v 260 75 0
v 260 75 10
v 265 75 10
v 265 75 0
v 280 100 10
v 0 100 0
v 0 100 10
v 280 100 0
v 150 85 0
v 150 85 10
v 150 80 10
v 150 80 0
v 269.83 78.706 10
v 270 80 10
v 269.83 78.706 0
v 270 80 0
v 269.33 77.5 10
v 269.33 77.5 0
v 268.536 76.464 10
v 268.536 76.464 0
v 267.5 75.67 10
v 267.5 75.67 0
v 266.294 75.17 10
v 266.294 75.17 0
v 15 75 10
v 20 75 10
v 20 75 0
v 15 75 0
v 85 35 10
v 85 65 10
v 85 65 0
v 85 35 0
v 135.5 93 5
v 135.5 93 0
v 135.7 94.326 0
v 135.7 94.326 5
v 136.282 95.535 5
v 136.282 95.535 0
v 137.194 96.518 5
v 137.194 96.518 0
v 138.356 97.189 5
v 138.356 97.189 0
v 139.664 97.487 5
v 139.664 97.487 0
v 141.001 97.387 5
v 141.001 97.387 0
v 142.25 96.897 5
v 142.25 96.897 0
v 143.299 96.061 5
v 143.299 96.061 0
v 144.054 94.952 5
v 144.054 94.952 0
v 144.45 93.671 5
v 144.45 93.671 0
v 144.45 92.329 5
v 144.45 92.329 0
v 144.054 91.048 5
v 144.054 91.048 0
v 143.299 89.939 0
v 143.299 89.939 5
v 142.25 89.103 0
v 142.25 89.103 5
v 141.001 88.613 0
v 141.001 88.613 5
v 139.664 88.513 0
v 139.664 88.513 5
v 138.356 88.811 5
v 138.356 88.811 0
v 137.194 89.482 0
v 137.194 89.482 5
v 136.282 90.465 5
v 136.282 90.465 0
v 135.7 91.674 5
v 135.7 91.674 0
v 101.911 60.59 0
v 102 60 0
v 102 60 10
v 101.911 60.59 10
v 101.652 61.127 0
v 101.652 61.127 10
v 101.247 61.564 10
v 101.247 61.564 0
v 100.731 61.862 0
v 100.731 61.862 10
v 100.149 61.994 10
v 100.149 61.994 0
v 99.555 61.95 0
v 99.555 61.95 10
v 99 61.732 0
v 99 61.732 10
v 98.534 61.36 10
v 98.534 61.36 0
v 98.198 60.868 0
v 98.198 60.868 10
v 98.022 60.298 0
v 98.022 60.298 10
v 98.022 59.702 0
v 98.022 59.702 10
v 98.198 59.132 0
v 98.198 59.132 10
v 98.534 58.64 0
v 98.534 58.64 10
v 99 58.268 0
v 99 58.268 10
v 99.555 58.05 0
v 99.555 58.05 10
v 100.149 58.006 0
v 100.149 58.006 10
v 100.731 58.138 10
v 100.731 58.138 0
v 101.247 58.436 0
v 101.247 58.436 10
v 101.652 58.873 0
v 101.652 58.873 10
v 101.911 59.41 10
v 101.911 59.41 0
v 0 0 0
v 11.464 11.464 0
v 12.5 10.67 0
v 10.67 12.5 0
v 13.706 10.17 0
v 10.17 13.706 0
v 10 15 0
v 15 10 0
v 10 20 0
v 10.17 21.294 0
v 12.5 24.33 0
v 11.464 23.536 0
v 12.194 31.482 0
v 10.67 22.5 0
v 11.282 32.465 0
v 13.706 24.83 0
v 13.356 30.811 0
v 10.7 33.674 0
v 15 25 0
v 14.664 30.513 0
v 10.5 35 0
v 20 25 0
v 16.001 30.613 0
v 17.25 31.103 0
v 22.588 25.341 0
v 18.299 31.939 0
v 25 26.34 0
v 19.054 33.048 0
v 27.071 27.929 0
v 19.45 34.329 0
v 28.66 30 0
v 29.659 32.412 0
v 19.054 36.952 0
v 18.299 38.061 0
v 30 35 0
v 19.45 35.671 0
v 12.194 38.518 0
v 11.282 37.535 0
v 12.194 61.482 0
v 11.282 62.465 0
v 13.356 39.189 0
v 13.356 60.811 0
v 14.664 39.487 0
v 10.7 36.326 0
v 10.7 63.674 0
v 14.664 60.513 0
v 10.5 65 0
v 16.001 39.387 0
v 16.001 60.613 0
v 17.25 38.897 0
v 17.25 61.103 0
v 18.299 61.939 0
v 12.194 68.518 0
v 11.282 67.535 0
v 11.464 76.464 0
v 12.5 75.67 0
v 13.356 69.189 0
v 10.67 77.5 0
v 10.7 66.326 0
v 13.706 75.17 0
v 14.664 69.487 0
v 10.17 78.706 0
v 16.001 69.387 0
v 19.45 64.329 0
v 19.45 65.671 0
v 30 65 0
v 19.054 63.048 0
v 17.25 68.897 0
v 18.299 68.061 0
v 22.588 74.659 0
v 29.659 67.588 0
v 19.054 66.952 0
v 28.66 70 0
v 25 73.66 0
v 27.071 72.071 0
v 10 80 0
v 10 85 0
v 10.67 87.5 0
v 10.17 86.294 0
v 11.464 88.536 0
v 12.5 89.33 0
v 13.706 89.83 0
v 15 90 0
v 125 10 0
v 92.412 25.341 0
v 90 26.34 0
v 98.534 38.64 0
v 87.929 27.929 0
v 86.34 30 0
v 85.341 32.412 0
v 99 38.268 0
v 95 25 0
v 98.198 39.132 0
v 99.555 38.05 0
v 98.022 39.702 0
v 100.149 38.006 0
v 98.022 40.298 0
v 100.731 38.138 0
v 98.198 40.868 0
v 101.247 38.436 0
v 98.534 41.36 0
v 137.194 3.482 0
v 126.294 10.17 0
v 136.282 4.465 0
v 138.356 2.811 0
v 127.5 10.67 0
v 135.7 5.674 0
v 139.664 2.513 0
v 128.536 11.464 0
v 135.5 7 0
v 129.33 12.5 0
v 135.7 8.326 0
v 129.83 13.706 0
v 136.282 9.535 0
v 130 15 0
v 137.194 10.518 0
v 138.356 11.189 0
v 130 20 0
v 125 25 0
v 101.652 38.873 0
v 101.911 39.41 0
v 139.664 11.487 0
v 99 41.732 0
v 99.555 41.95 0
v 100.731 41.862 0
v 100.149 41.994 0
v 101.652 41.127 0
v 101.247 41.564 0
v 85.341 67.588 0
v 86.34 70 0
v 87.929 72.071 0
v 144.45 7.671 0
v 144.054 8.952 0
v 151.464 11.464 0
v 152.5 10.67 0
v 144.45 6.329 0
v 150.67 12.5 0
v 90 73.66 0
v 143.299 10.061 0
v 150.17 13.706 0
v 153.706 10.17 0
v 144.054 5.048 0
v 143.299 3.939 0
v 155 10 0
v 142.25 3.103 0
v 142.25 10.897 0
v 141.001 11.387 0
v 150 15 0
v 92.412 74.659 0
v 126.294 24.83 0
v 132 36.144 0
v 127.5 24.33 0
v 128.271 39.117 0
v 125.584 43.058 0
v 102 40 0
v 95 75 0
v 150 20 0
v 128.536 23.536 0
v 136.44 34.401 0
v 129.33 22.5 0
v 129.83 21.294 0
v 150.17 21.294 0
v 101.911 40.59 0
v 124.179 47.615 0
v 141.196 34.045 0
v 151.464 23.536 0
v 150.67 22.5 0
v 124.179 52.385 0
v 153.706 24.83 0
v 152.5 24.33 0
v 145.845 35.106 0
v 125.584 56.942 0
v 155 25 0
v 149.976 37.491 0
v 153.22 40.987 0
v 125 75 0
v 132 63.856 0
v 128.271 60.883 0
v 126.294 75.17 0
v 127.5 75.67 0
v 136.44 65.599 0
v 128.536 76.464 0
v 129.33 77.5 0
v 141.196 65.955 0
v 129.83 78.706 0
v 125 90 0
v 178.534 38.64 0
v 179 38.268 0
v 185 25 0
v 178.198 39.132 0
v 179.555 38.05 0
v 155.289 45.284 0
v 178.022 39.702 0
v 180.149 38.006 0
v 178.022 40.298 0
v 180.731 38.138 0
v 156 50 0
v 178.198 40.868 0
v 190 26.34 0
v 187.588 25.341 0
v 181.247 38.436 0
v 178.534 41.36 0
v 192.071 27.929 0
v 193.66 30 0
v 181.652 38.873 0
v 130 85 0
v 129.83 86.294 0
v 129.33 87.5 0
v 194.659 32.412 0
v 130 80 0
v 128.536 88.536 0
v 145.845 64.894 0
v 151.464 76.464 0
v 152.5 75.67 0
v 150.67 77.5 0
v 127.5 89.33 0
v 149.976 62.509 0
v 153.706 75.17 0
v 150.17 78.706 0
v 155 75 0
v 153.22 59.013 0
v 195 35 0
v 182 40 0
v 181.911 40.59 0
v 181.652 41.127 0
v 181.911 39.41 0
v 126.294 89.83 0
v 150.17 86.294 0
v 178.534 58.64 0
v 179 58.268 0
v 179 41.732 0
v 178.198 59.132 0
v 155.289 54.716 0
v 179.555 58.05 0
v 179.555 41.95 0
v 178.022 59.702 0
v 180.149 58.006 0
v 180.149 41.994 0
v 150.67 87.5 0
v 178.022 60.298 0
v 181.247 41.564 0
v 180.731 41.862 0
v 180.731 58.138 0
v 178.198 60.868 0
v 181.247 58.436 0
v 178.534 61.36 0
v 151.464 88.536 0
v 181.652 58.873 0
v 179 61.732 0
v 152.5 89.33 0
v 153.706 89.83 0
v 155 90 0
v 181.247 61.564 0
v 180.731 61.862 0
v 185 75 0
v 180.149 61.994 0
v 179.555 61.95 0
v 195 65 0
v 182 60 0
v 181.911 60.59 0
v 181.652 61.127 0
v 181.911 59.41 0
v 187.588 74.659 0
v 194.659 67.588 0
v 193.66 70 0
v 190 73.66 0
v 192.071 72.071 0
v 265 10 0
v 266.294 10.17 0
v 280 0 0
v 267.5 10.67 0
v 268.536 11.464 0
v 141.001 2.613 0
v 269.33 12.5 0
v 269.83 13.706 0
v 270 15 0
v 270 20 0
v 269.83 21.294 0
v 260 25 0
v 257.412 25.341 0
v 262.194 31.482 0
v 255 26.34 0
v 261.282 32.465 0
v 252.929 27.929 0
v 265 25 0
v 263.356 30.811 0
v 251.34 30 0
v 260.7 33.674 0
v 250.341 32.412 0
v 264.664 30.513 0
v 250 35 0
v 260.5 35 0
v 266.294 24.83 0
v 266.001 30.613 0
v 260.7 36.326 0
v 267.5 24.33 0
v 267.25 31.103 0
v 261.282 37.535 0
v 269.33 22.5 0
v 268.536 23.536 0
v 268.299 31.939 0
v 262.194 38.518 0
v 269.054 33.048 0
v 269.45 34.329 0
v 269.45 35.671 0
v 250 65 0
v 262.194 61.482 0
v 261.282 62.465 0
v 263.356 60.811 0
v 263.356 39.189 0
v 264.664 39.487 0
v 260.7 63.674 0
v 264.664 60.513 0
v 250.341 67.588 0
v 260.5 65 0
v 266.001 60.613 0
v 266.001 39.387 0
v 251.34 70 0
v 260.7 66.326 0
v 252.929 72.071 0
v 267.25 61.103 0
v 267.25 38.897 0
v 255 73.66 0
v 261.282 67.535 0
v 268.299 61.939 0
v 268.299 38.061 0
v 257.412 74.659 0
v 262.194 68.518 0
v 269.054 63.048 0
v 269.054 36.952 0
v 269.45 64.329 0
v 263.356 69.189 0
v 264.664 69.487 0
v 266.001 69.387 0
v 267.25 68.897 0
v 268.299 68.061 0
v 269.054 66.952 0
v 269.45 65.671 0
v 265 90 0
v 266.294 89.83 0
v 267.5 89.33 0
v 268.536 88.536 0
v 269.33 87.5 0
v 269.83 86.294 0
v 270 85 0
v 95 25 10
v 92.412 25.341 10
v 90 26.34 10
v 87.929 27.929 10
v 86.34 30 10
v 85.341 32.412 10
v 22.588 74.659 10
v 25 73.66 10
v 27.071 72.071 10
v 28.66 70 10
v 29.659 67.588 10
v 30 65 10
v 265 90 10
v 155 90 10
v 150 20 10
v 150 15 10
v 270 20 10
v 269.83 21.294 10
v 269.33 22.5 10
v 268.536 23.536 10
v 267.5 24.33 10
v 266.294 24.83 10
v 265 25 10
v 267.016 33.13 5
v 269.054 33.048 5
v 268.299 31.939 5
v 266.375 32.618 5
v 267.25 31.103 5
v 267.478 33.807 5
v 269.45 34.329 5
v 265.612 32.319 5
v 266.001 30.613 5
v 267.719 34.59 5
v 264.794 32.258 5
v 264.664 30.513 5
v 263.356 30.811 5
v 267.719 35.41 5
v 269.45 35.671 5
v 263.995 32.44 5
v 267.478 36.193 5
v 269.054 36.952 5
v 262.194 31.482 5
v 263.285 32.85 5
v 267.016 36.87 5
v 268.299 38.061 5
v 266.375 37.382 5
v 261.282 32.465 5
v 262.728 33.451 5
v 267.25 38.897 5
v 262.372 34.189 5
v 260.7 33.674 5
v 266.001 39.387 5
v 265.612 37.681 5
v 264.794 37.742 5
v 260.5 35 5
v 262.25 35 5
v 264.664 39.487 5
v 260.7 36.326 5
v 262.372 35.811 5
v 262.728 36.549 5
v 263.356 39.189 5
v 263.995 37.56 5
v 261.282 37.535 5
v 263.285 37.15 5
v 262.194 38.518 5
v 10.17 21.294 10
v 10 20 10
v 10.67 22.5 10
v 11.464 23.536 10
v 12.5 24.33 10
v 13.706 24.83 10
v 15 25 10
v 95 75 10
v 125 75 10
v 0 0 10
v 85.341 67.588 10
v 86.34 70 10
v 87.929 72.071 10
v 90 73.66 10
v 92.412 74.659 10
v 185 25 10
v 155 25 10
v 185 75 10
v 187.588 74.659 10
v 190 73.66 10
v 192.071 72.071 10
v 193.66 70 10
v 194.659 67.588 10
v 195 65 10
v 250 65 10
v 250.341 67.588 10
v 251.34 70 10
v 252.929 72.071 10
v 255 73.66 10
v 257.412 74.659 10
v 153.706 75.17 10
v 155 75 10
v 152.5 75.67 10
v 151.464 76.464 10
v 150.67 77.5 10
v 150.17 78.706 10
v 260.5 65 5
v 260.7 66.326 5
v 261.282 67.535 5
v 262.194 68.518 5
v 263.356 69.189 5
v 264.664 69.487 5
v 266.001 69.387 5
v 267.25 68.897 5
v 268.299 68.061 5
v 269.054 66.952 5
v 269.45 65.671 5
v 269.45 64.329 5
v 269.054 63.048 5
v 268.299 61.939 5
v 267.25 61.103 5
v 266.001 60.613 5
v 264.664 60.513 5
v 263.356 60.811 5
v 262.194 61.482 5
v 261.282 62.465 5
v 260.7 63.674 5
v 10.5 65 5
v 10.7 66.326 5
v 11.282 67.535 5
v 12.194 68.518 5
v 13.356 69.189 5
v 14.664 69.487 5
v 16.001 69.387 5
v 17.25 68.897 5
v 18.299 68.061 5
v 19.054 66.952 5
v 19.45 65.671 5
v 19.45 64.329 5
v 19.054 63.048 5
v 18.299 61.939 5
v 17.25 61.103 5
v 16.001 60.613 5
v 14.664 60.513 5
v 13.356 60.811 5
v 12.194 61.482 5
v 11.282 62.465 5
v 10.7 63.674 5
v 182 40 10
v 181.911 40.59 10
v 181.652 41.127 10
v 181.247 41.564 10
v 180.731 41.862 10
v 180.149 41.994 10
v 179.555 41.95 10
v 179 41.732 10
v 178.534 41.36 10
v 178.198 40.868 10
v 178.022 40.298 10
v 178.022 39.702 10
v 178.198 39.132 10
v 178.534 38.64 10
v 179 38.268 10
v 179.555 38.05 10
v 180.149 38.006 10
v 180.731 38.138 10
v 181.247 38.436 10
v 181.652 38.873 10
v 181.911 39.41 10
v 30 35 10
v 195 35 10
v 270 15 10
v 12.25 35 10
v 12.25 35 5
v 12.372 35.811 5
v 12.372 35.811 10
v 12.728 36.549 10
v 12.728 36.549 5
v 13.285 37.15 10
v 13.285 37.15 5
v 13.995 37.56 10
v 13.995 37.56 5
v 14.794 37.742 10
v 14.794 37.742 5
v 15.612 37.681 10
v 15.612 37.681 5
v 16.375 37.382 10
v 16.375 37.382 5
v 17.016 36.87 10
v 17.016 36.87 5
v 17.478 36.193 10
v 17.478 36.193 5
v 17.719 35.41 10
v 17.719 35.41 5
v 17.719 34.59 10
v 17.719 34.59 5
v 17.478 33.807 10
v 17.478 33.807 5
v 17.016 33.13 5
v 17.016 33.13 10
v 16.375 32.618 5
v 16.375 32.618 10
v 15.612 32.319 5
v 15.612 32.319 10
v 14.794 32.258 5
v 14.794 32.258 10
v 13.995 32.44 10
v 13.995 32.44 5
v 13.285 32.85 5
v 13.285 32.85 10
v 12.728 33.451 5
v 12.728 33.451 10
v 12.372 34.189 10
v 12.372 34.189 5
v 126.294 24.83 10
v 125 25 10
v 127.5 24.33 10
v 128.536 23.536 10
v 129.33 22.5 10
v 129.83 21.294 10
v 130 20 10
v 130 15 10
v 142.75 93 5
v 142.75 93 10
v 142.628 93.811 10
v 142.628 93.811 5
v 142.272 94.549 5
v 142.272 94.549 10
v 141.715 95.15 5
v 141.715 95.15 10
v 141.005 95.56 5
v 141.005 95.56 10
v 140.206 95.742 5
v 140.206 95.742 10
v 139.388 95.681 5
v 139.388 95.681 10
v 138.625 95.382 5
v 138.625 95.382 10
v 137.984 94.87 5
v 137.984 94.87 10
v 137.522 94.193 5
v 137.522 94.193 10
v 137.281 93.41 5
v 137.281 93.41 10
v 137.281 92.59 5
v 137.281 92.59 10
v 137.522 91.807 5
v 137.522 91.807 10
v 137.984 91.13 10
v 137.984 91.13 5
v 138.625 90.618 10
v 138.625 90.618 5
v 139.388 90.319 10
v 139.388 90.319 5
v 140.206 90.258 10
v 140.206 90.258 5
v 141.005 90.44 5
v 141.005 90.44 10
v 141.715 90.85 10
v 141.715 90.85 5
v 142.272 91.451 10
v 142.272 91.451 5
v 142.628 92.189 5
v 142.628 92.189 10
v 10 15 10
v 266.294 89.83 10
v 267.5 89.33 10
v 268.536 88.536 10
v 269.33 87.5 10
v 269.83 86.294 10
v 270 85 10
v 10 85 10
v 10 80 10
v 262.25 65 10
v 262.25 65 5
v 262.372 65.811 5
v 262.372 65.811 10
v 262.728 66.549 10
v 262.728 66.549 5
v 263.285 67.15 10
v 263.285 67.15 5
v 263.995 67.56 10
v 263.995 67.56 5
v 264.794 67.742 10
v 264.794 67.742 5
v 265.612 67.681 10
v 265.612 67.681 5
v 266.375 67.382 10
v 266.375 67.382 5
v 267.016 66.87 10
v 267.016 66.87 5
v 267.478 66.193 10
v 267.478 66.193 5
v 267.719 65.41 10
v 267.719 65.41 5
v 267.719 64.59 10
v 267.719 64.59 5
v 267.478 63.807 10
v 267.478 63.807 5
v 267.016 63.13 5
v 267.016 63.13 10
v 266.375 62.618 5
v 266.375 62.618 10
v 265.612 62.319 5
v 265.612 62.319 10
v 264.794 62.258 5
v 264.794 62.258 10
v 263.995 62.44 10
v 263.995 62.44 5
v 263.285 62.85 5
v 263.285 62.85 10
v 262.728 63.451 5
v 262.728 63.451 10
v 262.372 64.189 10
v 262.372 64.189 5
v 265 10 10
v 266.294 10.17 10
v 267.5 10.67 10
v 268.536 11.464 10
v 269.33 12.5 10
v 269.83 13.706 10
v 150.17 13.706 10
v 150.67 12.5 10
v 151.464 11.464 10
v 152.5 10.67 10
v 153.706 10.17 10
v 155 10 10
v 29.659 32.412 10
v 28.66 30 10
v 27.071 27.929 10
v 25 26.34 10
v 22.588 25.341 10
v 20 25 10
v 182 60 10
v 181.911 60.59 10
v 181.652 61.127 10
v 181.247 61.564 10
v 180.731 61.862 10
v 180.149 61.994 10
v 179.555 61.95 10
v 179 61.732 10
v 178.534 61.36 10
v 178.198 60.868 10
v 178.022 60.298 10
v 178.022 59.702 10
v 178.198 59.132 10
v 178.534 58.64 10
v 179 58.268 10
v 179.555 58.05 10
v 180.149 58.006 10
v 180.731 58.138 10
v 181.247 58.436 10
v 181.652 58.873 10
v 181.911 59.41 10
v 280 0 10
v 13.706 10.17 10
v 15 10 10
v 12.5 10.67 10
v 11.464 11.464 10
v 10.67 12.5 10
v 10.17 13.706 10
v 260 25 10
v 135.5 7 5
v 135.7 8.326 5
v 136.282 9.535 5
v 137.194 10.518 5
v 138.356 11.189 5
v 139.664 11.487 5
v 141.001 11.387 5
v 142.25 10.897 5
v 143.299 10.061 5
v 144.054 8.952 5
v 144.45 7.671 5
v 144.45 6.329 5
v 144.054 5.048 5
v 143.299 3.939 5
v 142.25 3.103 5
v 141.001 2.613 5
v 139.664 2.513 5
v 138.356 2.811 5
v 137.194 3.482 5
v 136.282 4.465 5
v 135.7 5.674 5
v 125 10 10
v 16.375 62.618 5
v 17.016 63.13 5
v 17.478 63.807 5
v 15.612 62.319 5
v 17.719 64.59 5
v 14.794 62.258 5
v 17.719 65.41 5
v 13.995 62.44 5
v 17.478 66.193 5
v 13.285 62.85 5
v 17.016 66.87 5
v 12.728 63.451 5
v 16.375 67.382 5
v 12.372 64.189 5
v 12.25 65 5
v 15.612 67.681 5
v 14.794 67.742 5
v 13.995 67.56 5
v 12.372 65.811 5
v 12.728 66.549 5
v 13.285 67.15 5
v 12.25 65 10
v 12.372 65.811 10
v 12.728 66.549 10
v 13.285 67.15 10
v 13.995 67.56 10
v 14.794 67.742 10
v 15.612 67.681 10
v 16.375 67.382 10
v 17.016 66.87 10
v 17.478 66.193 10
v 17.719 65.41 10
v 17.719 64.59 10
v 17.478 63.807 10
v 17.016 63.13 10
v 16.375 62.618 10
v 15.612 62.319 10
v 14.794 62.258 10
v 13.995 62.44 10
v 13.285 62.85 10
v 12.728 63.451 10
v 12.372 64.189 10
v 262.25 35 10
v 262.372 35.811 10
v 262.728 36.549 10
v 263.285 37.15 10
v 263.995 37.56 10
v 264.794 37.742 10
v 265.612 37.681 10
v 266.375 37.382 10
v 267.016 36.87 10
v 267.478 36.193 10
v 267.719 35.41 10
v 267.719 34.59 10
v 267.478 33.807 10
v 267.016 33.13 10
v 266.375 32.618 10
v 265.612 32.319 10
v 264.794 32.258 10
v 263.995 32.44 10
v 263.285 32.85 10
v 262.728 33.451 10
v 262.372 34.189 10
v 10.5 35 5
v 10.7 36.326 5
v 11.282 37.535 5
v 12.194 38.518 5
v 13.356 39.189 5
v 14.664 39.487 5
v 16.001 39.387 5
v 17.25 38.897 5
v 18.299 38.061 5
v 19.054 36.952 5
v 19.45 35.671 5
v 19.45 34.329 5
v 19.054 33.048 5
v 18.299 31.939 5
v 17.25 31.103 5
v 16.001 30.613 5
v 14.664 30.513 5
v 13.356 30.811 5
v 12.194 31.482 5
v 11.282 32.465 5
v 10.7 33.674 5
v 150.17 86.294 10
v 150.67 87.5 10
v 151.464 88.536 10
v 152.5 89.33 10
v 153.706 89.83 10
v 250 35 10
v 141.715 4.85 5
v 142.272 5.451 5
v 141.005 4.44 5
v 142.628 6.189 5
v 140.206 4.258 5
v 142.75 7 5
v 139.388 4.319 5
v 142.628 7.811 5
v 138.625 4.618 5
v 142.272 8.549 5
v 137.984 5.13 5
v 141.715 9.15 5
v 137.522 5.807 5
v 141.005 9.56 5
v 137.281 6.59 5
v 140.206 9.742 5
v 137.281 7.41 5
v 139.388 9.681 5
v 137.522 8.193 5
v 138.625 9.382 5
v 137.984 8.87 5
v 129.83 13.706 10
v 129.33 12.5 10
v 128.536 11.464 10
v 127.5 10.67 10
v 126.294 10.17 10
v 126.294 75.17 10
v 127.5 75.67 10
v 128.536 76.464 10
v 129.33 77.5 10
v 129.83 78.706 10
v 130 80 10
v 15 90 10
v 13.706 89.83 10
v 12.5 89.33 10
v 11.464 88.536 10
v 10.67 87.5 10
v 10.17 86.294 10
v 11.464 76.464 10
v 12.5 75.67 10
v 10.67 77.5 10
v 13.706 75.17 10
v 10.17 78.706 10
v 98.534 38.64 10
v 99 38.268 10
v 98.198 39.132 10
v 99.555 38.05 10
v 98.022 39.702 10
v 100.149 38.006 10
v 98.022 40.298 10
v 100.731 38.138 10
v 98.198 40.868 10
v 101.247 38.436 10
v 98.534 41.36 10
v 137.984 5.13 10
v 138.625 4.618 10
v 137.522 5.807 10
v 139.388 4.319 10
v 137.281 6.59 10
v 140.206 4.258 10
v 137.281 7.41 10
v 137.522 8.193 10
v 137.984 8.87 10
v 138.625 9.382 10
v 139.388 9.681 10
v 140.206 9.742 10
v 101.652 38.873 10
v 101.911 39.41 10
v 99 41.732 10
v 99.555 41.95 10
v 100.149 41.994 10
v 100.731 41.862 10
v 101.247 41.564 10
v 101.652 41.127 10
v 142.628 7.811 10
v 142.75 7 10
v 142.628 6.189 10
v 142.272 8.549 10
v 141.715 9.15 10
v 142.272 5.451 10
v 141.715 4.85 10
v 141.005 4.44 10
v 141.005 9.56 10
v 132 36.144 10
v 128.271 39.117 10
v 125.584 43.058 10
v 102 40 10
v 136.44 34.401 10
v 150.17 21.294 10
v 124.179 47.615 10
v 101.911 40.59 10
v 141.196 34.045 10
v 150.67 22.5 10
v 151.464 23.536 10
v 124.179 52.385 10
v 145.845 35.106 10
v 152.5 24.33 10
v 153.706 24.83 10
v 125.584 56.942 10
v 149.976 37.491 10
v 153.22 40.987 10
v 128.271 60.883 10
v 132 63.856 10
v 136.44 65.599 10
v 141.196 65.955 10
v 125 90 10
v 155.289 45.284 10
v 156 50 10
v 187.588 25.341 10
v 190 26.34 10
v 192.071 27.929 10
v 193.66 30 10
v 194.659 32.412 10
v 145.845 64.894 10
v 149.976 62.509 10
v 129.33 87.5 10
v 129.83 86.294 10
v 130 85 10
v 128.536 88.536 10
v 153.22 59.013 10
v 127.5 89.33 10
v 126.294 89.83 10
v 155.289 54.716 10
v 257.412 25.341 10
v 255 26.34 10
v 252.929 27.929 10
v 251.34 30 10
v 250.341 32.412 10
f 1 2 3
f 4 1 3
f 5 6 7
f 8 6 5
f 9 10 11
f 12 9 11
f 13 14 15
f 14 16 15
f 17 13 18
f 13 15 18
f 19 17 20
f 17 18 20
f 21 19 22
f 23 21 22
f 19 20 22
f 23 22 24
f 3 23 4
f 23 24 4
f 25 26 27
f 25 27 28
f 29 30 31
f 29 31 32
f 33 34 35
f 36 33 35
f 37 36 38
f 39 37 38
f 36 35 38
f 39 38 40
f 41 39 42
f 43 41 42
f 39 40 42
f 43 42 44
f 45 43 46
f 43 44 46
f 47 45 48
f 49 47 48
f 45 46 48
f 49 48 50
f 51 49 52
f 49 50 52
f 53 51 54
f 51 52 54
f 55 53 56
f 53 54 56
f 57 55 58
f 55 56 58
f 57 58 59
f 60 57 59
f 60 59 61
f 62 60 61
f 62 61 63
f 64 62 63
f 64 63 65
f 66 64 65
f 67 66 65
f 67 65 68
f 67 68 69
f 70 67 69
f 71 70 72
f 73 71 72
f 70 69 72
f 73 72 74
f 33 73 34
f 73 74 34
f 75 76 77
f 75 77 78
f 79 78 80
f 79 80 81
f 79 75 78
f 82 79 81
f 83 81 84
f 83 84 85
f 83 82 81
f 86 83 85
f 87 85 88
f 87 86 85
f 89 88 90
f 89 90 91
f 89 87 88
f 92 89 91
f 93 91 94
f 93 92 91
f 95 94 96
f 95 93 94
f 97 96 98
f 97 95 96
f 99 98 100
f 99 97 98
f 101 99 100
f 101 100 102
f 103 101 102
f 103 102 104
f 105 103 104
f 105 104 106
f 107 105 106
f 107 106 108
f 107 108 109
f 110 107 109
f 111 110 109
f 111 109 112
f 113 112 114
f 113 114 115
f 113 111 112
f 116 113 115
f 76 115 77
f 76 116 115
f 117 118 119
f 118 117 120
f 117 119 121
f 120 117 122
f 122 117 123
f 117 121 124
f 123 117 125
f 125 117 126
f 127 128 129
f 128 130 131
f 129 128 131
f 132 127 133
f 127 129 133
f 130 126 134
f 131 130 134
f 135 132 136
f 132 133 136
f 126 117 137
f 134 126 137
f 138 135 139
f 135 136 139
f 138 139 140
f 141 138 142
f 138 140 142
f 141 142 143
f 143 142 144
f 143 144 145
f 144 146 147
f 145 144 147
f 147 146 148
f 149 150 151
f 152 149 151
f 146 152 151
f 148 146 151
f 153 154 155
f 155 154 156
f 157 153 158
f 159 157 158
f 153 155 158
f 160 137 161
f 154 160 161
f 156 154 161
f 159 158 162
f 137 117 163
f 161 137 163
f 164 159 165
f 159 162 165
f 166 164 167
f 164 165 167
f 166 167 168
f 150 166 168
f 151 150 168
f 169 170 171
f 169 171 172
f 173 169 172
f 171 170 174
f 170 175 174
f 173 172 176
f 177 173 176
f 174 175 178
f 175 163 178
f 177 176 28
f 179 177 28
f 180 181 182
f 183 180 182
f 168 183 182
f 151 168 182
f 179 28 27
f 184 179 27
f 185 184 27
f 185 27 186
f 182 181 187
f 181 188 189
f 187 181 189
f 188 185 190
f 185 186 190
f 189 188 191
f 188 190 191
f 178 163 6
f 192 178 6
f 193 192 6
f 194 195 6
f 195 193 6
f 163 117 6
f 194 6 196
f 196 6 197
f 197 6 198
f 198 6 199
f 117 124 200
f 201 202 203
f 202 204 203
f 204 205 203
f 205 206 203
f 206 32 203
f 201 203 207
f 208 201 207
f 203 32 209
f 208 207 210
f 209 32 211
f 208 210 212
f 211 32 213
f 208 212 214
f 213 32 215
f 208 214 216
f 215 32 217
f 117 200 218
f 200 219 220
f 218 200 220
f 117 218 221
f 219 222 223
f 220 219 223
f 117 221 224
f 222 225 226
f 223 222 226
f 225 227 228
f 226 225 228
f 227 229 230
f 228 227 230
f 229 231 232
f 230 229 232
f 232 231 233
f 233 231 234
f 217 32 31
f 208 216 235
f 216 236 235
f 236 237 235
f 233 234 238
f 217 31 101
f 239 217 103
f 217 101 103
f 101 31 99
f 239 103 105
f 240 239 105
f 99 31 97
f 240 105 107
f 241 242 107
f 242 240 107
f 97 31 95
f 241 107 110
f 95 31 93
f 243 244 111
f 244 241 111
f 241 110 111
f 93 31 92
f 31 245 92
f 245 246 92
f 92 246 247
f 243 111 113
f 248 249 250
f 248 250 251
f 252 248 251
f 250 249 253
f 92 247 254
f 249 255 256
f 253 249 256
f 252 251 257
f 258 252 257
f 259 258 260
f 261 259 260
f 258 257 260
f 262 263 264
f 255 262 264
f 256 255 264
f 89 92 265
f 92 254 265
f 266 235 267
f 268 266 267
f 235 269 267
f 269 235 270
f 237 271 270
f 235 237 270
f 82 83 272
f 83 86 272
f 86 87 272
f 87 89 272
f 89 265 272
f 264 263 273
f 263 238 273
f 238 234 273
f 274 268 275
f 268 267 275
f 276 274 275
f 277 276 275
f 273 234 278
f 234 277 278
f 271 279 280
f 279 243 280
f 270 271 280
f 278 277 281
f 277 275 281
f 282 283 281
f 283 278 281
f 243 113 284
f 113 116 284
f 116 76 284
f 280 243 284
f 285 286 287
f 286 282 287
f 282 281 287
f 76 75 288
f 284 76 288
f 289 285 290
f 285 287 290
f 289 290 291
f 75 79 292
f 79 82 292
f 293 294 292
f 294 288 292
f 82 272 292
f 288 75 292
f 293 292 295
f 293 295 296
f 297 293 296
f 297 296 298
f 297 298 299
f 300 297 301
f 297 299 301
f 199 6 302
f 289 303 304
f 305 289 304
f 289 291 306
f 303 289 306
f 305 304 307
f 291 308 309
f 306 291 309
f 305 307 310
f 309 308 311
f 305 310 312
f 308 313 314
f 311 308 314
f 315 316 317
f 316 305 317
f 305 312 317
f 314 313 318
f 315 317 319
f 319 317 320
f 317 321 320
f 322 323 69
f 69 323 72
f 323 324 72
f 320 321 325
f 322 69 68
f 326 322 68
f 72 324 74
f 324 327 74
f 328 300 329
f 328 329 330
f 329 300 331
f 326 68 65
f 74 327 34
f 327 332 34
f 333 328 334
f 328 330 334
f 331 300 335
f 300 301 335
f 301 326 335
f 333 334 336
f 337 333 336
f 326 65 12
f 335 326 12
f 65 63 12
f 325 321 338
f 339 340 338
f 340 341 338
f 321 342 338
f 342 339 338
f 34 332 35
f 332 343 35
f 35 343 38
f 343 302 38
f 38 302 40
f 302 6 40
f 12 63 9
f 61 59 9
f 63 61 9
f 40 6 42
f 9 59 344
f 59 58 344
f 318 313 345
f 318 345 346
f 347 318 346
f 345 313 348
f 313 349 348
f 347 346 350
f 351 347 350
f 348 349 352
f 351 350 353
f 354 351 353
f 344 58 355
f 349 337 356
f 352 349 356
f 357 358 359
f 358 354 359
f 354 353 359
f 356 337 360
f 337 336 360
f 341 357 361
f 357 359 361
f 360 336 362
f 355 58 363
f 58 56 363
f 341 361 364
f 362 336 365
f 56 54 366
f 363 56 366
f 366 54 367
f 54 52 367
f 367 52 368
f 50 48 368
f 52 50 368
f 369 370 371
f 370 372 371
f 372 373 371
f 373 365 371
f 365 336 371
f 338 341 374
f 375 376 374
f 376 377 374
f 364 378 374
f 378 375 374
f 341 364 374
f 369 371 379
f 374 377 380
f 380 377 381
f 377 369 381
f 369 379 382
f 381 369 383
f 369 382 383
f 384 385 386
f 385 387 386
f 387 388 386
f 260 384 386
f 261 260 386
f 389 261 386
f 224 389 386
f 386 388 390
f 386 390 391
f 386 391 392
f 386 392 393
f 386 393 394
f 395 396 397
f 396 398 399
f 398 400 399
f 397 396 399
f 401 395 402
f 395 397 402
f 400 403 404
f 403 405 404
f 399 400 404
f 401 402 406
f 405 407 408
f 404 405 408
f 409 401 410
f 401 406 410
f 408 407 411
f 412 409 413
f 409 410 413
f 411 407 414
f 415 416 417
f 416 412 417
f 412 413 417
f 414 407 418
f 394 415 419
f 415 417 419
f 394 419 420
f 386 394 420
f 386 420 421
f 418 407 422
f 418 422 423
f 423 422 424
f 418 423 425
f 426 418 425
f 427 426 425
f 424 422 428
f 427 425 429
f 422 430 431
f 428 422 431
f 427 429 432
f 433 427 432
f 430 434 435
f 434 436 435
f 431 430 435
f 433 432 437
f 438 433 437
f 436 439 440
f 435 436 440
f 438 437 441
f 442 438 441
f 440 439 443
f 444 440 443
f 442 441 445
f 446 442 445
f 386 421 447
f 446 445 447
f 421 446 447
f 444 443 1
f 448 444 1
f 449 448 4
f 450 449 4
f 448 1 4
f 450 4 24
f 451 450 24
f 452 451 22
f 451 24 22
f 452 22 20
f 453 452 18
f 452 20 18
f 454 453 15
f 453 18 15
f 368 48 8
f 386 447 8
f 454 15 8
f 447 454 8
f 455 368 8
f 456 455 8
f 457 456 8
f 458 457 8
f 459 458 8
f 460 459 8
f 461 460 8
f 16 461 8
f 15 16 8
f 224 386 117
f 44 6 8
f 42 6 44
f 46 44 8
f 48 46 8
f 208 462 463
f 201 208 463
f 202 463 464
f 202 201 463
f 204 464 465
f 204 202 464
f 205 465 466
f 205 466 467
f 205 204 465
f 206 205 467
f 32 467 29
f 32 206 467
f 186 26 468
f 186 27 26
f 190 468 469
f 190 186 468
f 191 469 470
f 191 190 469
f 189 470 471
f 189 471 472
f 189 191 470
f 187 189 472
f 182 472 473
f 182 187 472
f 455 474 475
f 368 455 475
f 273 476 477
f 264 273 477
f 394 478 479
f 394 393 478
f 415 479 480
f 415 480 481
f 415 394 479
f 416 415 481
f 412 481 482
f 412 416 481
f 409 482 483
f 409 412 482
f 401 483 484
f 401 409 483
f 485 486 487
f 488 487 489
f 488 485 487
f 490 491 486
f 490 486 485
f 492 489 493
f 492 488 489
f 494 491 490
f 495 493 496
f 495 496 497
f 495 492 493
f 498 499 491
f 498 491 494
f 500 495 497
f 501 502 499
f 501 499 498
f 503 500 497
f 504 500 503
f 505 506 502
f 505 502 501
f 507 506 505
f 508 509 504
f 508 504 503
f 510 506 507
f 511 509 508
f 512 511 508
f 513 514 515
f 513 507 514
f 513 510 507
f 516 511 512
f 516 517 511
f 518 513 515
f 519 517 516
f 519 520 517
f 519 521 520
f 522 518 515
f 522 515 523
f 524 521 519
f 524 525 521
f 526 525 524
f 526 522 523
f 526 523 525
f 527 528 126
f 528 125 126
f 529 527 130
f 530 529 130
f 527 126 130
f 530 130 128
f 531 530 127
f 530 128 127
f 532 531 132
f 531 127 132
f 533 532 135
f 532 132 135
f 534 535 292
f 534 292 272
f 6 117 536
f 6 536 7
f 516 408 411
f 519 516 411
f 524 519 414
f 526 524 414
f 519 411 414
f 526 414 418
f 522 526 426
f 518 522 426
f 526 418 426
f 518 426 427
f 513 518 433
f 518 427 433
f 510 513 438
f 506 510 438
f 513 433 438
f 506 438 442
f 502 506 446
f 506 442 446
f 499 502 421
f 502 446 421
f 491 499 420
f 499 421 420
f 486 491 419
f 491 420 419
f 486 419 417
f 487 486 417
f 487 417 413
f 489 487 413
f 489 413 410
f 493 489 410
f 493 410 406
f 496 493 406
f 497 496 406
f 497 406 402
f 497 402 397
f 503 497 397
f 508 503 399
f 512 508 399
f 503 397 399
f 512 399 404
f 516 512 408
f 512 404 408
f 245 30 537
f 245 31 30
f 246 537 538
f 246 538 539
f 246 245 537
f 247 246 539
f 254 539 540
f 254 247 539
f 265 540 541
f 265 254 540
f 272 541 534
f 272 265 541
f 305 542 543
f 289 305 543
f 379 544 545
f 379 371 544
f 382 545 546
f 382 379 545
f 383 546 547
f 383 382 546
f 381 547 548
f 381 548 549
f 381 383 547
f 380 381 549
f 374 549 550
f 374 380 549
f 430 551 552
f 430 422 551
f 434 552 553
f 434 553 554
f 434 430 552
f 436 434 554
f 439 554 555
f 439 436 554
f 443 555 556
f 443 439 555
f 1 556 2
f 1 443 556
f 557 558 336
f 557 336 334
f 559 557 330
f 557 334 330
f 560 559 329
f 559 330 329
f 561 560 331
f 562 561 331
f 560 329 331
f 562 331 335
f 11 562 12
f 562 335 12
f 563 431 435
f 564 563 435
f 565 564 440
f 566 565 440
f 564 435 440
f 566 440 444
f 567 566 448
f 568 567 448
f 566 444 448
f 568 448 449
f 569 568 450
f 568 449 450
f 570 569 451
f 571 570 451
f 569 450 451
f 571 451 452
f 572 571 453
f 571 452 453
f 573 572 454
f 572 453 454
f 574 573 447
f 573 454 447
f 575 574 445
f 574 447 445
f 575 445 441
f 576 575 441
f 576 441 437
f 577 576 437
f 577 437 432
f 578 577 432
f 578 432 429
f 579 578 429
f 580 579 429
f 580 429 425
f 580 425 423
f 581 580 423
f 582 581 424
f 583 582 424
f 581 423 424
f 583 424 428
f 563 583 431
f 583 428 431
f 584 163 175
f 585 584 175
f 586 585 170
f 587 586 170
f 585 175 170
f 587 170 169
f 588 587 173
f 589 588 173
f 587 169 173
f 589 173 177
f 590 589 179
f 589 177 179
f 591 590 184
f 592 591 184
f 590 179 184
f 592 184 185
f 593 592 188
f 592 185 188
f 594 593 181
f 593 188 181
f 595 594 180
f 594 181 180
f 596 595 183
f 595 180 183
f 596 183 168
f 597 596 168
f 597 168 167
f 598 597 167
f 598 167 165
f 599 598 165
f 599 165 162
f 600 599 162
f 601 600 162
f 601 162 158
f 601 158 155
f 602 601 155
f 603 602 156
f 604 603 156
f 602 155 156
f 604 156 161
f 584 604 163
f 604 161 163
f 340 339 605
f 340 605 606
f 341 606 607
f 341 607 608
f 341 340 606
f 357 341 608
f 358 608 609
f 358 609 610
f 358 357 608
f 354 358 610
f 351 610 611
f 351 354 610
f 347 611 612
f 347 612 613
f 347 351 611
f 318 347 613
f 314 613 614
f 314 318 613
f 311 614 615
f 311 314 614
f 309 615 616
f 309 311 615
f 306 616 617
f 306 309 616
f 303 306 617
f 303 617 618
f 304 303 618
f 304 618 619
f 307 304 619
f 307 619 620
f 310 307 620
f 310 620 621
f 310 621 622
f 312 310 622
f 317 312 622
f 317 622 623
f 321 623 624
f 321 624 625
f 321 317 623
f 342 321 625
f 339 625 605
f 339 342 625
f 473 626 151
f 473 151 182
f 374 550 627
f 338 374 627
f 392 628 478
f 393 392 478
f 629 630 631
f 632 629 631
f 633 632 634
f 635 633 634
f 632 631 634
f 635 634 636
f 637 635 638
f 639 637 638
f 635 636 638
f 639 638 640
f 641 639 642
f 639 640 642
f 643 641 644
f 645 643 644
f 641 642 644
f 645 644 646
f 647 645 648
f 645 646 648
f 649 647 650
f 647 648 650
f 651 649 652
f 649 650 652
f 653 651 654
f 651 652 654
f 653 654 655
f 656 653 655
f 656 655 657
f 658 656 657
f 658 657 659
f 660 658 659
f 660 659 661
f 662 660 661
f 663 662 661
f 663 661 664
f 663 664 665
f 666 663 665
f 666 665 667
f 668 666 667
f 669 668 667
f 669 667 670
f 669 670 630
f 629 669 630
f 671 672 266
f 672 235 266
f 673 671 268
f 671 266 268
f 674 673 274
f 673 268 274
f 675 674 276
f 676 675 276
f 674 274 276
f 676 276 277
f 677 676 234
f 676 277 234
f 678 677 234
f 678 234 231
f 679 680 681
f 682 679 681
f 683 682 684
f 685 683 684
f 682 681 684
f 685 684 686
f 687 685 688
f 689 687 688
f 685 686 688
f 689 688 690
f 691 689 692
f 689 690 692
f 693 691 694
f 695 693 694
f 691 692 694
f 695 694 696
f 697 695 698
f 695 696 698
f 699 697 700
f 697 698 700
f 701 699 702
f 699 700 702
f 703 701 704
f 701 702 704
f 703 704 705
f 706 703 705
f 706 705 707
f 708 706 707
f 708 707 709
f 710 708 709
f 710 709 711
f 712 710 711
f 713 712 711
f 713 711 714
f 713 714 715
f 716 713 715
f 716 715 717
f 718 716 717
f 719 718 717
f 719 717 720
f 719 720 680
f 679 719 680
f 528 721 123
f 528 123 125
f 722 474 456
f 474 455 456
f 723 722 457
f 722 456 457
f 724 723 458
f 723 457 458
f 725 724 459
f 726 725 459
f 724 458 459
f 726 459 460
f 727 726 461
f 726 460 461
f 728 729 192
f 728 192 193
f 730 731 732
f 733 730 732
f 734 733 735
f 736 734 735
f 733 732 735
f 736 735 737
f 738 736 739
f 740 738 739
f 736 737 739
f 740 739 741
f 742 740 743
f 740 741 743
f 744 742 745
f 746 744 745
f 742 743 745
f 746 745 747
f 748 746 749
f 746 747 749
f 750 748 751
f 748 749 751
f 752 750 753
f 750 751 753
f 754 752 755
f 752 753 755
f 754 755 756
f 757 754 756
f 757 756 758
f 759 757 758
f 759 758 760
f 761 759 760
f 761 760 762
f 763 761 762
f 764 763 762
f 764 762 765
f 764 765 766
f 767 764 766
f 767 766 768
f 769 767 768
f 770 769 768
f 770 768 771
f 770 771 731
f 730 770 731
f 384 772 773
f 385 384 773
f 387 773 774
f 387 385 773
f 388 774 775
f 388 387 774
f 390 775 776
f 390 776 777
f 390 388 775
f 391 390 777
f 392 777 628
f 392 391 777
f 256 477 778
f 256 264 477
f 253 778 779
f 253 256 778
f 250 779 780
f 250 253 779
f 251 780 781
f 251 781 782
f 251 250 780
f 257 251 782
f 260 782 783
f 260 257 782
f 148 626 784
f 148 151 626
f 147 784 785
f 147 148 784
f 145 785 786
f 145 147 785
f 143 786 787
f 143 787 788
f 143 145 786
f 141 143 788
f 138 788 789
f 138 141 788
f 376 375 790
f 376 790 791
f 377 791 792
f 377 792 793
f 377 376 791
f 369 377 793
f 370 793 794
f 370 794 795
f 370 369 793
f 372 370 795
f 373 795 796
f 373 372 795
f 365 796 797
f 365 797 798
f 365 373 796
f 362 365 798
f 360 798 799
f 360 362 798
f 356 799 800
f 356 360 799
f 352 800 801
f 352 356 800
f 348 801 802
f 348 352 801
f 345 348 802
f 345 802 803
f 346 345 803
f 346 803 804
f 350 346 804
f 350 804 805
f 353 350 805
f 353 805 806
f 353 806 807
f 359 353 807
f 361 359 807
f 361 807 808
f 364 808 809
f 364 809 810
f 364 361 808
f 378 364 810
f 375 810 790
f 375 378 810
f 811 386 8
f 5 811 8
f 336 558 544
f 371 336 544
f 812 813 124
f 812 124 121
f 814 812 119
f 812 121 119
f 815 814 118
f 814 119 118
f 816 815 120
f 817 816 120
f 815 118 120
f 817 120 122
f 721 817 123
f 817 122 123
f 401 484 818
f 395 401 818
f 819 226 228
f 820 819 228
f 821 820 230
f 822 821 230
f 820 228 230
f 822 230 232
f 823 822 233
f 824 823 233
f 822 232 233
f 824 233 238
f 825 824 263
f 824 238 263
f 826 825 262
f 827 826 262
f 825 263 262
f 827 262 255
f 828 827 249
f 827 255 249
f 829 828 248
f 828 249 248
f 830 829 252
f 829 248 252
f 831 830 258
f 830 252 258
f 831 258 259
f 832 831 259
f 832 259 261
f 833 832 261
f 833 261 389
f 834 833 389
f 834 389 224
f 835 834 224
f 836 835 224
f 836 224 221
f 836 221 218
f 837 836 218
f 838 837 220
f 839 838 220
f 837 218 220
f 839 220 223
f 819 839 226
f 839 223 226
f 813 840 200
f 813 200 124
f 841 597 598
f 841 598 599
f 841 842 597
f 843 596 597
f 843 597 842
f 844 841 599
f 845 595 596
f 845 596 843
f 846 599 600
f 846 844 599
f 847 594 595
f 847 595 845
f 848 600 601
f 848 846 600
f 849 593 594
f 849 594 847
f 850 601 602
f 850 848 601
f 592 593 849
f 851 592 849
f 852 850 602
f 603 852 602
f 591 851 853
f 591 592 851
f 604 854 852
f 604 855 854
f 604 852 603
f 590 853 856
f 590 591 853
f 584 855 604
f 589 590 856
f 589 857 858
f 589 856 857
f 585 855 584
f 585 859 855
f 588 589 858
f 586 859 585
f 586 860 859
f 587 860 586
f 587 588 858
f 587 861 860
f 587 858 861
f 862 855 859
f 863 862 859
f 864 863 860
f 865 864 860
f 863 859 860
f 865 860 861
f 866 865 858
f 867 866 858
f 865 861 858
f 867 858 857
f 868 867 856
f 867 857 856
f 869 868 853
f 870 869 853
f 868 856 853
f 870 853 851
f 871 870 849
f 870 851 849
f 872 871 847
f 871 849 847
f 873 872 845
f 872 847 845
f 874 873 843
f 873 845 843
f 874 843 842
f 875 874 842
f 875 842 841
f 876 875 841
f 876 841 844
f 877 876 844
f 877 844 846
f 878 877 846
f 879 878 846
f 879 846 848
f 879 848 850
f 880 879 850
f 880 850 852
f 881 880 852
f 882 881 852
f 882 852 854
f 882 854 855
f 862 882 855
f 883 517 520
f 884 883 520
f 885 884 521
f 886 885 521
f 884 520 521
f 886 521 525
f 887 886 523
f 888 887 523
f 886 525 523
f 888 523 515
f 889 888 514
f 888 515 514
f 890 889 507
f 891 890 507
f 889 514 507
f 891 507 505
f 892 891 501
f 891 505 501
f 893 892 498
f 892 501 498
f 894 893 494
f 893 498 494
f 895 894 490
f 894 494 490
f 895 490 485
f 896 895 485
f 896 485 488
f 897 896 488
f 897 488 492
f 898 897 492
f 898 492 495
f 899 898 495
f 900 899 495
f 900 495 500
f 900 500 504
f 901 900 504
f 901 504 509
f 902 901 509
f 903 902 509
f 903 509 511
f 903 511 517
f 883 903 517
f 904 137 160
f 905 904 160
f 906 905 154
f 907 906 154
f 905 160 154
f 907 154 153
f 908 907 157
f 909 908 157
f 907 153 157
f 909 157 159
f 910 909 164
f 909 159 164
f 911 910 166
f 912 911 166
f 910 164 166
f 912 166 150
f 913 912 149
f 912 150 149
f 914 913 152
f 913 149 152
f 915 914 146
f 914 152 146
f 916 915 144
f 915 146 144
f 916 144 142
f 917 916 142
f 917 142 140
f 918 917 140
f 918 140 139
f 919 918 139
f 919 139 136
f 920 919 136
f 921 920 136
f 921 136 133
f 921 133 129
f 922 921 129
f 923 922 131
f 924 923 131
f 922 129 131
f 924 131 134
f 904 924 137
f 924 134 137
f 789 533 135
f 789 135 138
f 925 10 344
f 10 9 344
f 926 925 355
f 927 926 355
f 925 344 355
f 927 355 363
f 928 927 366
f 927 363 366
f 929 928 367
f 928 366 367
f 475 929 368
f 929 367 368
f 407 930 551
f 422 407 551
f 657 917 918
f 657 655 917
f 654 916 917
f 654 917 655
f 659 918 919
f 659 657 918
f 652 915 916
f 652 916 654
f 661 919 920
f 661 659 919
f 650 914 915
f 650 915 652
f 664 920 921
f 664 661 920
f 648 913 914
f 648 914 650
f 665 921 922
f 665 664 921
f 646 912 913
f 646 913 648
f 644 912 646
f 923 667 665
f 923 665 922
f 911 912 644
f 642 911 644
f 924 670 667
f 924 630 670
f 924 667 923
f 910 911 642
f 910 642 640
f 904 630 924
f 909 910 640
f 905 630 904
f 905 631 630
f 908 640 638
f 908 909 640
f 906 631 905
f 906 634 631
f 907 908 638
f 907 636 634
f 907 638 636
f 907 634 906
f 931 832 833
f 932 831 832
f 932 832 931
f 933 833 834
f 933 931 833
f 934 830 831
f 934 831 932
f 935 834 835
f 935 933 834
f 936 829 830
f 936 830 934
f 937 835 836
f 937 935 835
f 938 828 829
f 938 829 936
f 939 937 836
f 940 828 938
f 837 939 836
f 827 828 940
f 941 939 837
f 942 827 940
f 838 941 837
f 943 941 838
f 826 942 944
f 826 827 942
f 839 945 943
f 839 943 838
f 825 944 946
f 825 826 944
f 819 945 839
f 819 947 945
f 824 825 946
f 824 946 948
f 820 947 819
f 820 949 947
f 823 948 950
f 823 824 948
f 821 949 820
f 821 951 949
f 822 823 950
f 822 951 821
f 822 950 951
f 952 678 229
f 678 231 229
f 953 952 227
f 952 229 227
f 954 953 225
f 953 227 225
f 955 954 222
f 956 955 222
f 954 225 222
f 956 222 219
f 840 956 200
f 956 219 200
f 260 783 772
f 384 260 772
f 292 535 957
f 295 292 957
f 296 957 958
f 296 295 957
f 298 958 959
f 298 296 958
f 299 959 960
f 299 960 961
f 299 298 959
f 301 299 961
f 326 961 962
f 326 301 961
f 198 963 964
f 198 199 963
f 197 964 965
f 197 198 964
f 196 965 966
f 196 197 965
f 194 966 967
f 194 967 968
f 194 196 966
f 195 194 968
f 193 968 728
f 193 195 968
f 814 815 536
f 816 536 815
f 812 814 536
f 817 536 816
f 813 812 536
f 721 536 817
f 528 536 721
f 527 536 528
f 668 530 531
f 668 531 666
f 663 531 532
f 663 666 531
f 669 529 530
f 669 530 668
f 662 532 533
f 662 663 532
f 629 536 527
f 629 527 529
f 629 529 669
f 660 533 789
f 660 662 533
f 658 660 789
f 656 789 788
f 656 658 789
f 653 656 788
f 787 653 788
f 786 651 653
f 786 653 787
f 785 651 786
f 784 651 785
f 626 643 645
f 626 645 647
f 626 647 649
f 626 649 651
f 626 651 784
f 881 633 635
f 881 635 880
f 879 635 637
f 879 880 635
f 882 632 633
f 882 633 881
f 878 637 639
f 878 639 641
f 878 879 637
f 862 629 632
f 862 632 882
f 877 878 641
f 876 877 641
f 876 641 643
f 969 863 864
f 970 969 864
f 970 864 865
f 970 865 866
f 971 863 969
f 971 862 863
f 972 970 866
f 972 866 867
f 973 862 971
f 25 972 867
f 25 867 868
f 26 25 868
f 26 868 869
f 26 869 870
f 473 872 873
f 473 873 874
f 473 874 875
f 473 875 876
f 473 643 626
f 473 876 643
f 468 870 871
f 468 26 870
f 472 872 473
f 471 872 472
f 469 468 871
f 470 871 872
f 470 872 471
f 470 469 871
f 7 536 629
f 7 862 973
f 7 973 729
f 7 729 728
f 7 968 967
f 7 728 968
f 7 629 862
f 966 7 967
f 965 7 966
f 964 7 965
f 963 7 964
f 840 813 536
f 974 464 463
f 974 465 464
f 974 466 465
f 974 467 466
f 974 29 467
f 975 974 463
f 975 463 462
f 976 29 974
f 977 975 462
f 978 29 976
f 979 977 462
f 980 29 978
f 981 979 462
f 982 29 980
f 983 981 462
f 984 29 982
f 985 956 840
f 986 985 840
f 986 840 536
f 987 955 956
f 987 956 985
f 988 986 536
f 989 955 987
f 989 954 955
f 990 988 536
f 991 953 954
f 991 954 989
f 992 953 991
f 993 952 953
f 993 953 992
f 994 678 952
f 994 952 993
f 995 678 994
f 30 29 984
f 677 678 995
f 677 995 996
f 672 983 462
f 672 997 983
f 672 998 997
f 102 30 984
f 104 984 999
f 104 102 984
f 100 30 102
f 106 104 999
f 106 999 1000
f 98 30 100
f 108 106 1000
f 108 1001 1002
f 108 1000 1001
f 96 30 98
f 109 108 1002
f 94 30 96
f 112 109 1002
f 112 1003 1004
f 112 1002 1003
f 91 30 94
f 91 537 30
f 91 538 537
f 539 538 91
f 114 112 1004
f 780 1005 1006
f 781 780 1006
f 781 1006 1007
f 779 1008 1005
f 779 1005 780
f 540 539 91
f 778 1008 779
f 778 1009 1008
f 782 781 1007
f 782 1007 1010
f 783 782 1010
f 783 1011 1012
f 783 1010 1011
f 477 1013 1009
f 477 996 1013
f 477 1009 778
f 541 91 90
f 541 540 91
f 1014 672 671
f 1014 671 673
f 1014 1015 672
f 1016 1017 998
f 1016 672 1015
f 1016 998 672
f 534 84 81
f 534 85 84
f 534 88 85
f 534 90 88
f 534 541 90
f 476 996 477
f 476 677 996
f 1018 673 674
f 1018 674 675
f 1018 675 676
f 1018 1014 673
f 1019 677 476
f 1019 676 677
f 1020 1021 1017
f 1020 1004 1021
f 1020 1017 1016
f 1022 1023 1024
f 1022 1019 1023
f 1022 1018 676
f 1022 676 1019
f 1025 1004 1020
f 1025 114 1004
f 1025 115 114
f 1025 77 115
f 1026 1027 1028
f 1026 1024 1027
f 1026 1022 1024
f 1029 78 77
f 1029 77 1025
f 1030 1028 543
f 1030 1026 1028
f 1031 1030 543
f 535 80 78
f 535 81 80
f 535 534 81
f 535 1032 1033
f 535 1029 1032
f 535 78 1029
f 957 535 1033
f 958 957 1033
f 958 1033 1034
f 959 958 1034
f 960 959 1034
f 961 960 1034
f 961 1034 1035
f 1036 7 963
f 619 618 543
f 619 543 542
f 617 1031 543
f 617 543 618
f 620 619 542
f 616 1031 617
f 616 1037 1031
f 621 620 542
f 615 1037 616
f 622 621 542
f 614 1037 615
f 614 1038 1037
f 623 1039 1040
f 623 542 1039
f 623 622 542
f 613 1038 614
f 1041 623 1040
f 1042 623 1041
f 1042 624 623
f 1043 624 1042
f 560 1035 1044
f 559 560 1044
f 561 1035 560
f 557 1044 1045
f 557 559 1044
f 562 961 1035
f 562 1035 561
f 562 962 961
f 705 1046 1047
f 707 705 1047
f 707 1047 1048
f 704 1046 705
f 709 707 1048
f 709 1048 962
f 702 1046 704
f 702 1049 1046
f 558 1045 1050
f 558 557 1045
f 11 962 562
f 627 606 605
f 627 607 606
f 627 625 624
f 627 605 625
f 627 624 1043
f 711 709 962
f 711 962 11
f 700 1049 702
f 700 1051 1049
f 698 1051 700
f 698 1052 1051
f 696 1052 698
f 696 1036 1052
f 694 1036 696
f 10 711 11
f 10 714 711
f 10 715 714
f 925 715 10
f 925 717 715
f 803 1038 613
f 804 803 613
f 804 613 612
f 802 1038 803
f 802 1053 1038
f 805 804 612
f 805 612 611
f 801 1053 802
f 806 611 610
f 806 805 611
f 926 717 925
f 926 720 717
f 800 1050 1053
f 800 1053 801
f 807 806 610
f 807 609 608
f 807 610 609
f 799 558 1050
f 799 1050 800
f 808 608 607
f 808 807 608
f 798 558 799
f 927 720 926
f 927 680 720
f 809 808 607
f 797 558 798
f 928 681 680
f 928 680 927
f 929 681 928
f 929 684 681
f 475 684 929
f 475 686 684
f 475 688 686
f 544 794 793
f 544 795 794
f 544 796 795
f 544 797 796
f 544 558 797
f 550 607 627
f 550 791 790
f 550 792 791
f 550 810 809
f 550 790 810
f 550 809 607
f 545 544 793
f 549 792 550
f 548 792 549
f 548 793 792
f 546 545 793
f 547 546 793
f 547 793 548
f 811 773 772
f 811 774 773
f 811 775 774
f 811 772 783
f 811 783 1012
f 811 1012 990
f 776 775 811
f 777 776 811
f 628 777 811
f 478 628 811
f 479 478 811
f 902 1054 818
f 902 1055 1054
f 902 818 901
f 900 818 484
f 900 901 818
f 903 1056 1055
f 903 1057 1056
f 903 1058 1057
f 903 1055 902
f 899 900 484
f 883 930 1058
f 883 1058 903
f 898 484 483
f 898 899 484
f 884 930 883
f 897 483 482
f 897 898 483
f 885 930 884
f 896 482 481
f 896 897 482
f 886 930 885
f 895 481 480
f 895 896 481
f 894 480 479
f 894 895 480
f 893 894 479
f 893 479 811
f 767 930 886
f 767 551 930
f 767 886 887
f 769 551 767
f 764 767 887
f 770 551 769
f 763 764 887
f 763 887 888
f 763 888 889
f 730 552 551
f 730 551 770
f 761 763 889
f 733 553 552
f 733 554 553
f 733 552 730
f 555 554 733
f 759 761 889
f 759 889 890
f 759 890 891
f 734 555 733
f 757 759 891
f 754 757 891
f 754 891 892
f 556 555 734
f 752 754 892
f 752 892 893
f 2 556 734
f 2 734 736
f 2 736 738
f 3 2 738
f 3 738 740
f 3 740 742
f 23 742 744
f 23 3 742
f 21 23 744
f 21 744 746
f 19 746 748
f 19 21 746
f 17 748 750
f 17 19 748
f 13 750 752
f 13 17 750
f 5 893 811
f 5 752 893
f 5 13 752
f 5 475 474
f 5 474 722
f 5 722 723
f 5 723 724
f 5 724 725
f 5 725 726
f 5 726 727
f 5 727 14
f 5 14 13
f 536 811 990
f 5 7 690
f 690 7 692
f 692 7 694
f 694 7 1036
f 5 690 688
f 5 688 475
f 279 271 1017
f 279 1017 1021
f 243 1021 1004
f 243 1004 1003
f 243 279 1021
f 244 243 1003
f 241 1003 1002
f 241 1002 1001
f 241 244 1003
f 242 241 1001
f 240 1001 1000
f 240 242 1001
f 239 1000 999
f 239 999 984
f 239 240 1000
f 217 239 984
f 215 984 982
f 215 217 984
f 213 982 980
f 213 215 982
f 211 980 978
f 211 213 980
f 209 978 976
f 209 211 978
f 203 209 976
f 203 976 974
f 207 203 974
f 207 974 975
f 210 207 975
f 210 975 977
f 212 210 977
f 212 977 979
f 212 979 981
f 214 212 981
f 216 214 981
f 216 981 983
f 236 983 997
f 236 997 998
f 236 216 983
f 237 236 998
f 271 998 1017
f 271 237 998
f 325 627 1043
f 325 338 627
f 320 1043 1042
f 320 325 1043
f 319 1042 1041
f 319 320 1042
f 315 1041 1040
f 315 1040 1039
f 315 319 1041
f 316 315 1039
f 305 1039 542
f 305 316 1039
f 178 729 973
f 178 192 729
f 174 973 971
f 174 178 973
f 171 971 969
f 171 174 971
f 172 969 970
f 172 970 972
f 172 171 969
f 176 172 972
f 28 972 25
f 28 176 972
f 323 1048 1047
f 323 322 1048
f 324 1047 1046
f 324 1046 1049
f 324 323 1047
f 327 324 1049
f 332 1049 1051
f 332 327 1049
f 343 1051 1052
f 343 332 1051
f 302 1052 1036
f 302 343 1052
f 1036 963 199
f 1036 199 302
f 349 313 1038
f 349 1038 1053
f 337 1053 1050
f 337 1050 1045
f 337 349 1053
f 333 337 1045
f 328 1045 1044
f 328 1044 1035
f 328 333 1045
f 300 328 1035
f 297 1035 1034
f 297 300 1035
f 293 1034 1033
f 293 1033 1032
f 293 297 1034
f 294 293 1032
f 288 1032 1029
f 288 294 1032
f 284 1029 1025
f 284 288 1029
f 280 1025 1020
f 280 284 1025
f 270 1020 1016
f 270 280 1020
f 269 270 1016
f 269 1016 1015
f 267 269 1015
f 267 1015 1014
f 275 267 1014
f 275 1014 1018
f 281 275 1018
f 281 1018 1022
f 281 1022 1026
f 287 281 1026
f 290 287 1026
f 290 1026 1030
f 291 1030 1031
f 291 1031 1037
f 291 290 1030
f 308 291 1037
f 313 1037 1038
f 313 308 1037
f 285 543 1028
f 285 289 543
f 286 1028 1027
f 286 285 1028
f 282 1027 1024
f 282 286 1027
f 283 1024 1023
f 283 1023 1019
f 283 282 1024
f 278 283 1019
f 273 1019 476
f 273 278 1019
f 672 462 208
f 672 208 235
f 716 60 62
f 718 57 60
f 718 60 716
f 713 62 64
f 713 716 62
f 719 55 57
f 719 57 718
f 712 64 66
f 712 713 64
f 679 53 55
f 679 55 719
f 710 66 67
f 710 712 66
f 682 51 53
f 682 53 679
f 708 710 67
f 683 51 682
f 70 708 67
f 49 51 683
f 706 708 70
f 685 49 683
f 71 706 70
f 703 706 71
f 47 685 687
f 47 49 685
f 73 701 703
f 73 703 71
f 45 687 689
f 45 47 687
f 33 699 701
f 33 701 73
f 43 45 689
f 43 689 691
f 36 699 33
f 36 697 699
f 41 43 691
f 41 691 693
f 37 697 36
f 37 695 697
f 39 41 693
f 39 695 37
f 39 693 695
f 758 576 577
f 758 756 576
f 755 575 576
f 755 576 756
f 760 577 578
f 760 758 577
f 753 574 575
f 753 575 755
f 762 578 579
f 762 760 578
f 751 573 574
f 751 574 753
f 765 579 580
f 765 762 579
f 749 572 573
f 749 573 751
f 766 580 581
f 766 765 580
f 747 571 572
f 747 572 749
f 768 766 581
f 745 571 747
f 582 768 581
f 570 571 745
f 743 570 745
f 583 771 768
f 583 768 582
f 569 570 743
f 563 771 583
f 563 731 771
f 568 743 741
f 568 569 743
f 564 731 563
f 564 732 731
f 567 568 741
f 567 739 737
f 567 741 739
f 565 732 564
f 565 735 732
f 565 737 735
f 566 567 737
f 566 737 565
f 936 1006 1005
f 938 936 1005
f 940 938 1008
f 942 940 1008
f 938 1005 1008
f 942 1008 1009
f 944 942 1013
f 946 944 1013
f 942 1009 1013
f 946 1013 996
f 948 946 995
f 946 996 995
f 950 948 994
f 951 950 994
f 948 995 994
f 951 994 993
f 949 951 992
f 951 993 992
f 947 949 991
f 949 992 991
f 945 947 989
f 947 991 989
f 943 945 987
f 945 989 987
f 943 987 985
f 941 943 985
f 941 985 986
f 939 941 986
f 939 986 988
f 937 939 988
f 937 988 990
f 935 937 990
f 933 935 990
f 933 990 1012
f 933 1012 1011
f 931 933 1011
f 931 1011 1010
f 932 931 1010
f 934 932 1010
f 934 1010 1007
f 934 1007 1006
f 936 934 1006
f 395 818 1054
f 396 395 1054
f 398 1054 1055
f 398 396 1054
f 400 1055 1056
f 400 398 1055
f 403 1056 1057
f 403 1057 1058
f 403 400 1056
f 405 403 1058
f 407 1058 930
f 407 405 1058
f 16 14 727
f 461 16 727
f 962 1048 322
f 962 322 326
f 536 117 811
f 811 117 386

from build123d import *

# Parameters (mm, degrees)
SKETCH1_W           = 280
SKETCH1_H           = 100
SKETCH1_R           = 2
SKETCH1_R_2         = 16
BOSS_EXTRUDE1_DEPTH = 10
SKETCH2_R           = 2.75
CUT_EXTRUDE1_DEPTH  = 11
SKETCH3_R           = 4.5
CUT_EXTRUDE2_DEPTH  = 5
CUT_EXTRUDE3_DEPTH  = 11
FILLET1_R           = 10
FILLET2_R           = 5
SKETCH5_R           = 2.75
CUT_EXTRUDE4_DEPTH  = 11
SKETCH6_R           = 4.5
CUT_EXTRUDE5_DEPTH  = 5


with BuildPart() as part:
    # Sketch1 → Boss-Extrude1 (new body)
    with BuildSketch(Plane.XY):
        with Locations((140, 50)):
            Rectangle(SKETCH1_W, SKETCH1_H)
        with Locations((180, 60)):
            Circle(SKETCH1_R, mode=Mode.SUBTRACT)
        with Locations((180, 40)):
            Circle(SKETCH1_R, mode=Mode.SUBTRACT)
        with Locations((100, 60)):
            Circle(SKETCH1_R, mode=Mode.SUBTRACT)
        with Locations((100, 40)):
            Circle(SKETCH1_R, mode=Mode.SUBTRACT)
        with Locations((140, 50)):
            Circle(SKETCH1_R_2, mode=Mode.SUBTRACT)
    extrude(amount=BOSS_EXTRUDE1_DEPTH)

    # Sketch2 → Cut-Extrude1 (cut, through all)
    with BuildSketch(Plane(origin=(0, 0, 0), x_dir=(-1, 0, 0), z_dir=(0, 0, -1))):
        with Locations((-15, 35)):
            Circle(SKETCH2_R)
        with Locations((-15, 65)):
            Circle(SKETCH2_R)
        with Locations((-265, 35)):
            Circle(SKETCH2_R)
        with Locations((-265, 65)):
            Circle(SKETCH2_R)
    extrude(amount=-CUT_EXTRUDE1_DEPTH, mode=Mode.SUBTRACT)

    # Sketch3 → Cut-Extrude2 (cut)
    with BuildSketch(Plane(origin=(0, 0, 0), x_dir=(-1, 0, 0), z_dir=(0, 0, -1))):
        with Locations((-265, 65)):
            Circle(SKETCH3_R)
        with Locations((-265, 35)):
            Circle(SKETCH3_R)
        with Locations((-15, 35)):
            Circle(SKETCH3_R)
        with Locations((-15, 65)):
            Circle(SKETCH3_R)
    extrude(amount=-CUT_EXTRUDE2_DEPTH, mode=Mode.SUBTRACT)

    # Sketch4 → Cut-Extrude3 (cut, through all)
    with BuildSketch(Plane.XY.offset(10)):
        Polygon((10, 25), (30, 25), (30, 75), (10, 75), (10, 90), (130, 90), (130, 75), (85, 75), (85, 25), (130, 25), (130, 10), (10, 10), align=None)
        Polygon((150, 90), (150, 75), (195, 75), (195, 25), (150, 25), (150, 10), (270, 10), (270, 25), (250, 25), (250, 75), (270, 75), (270, 90), align=None)
    extrude(amount=-CUT_EXTRUDE3_DEPTH, mode=Mode.SUBTRACT)

    # Fillet1
    fillet1_edges = [part.edges().sort_by_distance(p)[0] for p in [
        (250, 75, 5),
        (250, 25, 5),
        (195, 25, 5),
        (195, 75, 5),
        (30, 25, 5),
        (30, 75, 5),
        (85, 75, 5),
        (85, 25, 5),
    ]]
    fillet(fillet1_edges, radius=FILLET1_R)

    # Fillet2
    fillet2_edges = [part.edges().sort_by_distance(p)[0] for p in [
        (150, 90, 5),
        (270, 90, 5),
        (270, 75, 5),
        (270, 25, 5),
        (270, 10, 5),
        (150, 10, 5),
        (150, 25, 5),
        (150, 75, 5),
        (10, 10, 5),
        (10, 25, 5),
        (10, 75, 5),
        (10, 90, 5),
        (130, 90, 5),
        (130, 75, 5),
        (130, 25, 5),
        (130, 10, 5),
    ]]
    fillet(fillet2_edges, radius=FILLET2_R)

    # Sketch5 → Cut-Extrude4 (cut, through all)
    with BuildSketch(Plane.XY.offset(10)):
        with Locations((140, 7)):
            Circle(SKETCH5_R)
        with Locations((140, 93)):
            Circle(SKETCH5_R)
    extrude(amount=-CUT_EXTRUDE4_DEPTH, mode=Mode.SUBTRACT)

    # Sketch6 → Cut-Extrude5 (cut)
    with BuildSketch(Plane(origin=(0, 0, 0), x_dir=(-1, 0, 0), z_dir=(0, 0, -1))):
        with Locations((-140, 7)):
            Circle(SKETCH6_R)
        with Locations((-140, 93)):
            Circle(SKETCH6_R)
    extrude(amount=-CUT_EXTRUDE5_DEPTH, mode=Mode.SUBTRACT)


solid = part.part
